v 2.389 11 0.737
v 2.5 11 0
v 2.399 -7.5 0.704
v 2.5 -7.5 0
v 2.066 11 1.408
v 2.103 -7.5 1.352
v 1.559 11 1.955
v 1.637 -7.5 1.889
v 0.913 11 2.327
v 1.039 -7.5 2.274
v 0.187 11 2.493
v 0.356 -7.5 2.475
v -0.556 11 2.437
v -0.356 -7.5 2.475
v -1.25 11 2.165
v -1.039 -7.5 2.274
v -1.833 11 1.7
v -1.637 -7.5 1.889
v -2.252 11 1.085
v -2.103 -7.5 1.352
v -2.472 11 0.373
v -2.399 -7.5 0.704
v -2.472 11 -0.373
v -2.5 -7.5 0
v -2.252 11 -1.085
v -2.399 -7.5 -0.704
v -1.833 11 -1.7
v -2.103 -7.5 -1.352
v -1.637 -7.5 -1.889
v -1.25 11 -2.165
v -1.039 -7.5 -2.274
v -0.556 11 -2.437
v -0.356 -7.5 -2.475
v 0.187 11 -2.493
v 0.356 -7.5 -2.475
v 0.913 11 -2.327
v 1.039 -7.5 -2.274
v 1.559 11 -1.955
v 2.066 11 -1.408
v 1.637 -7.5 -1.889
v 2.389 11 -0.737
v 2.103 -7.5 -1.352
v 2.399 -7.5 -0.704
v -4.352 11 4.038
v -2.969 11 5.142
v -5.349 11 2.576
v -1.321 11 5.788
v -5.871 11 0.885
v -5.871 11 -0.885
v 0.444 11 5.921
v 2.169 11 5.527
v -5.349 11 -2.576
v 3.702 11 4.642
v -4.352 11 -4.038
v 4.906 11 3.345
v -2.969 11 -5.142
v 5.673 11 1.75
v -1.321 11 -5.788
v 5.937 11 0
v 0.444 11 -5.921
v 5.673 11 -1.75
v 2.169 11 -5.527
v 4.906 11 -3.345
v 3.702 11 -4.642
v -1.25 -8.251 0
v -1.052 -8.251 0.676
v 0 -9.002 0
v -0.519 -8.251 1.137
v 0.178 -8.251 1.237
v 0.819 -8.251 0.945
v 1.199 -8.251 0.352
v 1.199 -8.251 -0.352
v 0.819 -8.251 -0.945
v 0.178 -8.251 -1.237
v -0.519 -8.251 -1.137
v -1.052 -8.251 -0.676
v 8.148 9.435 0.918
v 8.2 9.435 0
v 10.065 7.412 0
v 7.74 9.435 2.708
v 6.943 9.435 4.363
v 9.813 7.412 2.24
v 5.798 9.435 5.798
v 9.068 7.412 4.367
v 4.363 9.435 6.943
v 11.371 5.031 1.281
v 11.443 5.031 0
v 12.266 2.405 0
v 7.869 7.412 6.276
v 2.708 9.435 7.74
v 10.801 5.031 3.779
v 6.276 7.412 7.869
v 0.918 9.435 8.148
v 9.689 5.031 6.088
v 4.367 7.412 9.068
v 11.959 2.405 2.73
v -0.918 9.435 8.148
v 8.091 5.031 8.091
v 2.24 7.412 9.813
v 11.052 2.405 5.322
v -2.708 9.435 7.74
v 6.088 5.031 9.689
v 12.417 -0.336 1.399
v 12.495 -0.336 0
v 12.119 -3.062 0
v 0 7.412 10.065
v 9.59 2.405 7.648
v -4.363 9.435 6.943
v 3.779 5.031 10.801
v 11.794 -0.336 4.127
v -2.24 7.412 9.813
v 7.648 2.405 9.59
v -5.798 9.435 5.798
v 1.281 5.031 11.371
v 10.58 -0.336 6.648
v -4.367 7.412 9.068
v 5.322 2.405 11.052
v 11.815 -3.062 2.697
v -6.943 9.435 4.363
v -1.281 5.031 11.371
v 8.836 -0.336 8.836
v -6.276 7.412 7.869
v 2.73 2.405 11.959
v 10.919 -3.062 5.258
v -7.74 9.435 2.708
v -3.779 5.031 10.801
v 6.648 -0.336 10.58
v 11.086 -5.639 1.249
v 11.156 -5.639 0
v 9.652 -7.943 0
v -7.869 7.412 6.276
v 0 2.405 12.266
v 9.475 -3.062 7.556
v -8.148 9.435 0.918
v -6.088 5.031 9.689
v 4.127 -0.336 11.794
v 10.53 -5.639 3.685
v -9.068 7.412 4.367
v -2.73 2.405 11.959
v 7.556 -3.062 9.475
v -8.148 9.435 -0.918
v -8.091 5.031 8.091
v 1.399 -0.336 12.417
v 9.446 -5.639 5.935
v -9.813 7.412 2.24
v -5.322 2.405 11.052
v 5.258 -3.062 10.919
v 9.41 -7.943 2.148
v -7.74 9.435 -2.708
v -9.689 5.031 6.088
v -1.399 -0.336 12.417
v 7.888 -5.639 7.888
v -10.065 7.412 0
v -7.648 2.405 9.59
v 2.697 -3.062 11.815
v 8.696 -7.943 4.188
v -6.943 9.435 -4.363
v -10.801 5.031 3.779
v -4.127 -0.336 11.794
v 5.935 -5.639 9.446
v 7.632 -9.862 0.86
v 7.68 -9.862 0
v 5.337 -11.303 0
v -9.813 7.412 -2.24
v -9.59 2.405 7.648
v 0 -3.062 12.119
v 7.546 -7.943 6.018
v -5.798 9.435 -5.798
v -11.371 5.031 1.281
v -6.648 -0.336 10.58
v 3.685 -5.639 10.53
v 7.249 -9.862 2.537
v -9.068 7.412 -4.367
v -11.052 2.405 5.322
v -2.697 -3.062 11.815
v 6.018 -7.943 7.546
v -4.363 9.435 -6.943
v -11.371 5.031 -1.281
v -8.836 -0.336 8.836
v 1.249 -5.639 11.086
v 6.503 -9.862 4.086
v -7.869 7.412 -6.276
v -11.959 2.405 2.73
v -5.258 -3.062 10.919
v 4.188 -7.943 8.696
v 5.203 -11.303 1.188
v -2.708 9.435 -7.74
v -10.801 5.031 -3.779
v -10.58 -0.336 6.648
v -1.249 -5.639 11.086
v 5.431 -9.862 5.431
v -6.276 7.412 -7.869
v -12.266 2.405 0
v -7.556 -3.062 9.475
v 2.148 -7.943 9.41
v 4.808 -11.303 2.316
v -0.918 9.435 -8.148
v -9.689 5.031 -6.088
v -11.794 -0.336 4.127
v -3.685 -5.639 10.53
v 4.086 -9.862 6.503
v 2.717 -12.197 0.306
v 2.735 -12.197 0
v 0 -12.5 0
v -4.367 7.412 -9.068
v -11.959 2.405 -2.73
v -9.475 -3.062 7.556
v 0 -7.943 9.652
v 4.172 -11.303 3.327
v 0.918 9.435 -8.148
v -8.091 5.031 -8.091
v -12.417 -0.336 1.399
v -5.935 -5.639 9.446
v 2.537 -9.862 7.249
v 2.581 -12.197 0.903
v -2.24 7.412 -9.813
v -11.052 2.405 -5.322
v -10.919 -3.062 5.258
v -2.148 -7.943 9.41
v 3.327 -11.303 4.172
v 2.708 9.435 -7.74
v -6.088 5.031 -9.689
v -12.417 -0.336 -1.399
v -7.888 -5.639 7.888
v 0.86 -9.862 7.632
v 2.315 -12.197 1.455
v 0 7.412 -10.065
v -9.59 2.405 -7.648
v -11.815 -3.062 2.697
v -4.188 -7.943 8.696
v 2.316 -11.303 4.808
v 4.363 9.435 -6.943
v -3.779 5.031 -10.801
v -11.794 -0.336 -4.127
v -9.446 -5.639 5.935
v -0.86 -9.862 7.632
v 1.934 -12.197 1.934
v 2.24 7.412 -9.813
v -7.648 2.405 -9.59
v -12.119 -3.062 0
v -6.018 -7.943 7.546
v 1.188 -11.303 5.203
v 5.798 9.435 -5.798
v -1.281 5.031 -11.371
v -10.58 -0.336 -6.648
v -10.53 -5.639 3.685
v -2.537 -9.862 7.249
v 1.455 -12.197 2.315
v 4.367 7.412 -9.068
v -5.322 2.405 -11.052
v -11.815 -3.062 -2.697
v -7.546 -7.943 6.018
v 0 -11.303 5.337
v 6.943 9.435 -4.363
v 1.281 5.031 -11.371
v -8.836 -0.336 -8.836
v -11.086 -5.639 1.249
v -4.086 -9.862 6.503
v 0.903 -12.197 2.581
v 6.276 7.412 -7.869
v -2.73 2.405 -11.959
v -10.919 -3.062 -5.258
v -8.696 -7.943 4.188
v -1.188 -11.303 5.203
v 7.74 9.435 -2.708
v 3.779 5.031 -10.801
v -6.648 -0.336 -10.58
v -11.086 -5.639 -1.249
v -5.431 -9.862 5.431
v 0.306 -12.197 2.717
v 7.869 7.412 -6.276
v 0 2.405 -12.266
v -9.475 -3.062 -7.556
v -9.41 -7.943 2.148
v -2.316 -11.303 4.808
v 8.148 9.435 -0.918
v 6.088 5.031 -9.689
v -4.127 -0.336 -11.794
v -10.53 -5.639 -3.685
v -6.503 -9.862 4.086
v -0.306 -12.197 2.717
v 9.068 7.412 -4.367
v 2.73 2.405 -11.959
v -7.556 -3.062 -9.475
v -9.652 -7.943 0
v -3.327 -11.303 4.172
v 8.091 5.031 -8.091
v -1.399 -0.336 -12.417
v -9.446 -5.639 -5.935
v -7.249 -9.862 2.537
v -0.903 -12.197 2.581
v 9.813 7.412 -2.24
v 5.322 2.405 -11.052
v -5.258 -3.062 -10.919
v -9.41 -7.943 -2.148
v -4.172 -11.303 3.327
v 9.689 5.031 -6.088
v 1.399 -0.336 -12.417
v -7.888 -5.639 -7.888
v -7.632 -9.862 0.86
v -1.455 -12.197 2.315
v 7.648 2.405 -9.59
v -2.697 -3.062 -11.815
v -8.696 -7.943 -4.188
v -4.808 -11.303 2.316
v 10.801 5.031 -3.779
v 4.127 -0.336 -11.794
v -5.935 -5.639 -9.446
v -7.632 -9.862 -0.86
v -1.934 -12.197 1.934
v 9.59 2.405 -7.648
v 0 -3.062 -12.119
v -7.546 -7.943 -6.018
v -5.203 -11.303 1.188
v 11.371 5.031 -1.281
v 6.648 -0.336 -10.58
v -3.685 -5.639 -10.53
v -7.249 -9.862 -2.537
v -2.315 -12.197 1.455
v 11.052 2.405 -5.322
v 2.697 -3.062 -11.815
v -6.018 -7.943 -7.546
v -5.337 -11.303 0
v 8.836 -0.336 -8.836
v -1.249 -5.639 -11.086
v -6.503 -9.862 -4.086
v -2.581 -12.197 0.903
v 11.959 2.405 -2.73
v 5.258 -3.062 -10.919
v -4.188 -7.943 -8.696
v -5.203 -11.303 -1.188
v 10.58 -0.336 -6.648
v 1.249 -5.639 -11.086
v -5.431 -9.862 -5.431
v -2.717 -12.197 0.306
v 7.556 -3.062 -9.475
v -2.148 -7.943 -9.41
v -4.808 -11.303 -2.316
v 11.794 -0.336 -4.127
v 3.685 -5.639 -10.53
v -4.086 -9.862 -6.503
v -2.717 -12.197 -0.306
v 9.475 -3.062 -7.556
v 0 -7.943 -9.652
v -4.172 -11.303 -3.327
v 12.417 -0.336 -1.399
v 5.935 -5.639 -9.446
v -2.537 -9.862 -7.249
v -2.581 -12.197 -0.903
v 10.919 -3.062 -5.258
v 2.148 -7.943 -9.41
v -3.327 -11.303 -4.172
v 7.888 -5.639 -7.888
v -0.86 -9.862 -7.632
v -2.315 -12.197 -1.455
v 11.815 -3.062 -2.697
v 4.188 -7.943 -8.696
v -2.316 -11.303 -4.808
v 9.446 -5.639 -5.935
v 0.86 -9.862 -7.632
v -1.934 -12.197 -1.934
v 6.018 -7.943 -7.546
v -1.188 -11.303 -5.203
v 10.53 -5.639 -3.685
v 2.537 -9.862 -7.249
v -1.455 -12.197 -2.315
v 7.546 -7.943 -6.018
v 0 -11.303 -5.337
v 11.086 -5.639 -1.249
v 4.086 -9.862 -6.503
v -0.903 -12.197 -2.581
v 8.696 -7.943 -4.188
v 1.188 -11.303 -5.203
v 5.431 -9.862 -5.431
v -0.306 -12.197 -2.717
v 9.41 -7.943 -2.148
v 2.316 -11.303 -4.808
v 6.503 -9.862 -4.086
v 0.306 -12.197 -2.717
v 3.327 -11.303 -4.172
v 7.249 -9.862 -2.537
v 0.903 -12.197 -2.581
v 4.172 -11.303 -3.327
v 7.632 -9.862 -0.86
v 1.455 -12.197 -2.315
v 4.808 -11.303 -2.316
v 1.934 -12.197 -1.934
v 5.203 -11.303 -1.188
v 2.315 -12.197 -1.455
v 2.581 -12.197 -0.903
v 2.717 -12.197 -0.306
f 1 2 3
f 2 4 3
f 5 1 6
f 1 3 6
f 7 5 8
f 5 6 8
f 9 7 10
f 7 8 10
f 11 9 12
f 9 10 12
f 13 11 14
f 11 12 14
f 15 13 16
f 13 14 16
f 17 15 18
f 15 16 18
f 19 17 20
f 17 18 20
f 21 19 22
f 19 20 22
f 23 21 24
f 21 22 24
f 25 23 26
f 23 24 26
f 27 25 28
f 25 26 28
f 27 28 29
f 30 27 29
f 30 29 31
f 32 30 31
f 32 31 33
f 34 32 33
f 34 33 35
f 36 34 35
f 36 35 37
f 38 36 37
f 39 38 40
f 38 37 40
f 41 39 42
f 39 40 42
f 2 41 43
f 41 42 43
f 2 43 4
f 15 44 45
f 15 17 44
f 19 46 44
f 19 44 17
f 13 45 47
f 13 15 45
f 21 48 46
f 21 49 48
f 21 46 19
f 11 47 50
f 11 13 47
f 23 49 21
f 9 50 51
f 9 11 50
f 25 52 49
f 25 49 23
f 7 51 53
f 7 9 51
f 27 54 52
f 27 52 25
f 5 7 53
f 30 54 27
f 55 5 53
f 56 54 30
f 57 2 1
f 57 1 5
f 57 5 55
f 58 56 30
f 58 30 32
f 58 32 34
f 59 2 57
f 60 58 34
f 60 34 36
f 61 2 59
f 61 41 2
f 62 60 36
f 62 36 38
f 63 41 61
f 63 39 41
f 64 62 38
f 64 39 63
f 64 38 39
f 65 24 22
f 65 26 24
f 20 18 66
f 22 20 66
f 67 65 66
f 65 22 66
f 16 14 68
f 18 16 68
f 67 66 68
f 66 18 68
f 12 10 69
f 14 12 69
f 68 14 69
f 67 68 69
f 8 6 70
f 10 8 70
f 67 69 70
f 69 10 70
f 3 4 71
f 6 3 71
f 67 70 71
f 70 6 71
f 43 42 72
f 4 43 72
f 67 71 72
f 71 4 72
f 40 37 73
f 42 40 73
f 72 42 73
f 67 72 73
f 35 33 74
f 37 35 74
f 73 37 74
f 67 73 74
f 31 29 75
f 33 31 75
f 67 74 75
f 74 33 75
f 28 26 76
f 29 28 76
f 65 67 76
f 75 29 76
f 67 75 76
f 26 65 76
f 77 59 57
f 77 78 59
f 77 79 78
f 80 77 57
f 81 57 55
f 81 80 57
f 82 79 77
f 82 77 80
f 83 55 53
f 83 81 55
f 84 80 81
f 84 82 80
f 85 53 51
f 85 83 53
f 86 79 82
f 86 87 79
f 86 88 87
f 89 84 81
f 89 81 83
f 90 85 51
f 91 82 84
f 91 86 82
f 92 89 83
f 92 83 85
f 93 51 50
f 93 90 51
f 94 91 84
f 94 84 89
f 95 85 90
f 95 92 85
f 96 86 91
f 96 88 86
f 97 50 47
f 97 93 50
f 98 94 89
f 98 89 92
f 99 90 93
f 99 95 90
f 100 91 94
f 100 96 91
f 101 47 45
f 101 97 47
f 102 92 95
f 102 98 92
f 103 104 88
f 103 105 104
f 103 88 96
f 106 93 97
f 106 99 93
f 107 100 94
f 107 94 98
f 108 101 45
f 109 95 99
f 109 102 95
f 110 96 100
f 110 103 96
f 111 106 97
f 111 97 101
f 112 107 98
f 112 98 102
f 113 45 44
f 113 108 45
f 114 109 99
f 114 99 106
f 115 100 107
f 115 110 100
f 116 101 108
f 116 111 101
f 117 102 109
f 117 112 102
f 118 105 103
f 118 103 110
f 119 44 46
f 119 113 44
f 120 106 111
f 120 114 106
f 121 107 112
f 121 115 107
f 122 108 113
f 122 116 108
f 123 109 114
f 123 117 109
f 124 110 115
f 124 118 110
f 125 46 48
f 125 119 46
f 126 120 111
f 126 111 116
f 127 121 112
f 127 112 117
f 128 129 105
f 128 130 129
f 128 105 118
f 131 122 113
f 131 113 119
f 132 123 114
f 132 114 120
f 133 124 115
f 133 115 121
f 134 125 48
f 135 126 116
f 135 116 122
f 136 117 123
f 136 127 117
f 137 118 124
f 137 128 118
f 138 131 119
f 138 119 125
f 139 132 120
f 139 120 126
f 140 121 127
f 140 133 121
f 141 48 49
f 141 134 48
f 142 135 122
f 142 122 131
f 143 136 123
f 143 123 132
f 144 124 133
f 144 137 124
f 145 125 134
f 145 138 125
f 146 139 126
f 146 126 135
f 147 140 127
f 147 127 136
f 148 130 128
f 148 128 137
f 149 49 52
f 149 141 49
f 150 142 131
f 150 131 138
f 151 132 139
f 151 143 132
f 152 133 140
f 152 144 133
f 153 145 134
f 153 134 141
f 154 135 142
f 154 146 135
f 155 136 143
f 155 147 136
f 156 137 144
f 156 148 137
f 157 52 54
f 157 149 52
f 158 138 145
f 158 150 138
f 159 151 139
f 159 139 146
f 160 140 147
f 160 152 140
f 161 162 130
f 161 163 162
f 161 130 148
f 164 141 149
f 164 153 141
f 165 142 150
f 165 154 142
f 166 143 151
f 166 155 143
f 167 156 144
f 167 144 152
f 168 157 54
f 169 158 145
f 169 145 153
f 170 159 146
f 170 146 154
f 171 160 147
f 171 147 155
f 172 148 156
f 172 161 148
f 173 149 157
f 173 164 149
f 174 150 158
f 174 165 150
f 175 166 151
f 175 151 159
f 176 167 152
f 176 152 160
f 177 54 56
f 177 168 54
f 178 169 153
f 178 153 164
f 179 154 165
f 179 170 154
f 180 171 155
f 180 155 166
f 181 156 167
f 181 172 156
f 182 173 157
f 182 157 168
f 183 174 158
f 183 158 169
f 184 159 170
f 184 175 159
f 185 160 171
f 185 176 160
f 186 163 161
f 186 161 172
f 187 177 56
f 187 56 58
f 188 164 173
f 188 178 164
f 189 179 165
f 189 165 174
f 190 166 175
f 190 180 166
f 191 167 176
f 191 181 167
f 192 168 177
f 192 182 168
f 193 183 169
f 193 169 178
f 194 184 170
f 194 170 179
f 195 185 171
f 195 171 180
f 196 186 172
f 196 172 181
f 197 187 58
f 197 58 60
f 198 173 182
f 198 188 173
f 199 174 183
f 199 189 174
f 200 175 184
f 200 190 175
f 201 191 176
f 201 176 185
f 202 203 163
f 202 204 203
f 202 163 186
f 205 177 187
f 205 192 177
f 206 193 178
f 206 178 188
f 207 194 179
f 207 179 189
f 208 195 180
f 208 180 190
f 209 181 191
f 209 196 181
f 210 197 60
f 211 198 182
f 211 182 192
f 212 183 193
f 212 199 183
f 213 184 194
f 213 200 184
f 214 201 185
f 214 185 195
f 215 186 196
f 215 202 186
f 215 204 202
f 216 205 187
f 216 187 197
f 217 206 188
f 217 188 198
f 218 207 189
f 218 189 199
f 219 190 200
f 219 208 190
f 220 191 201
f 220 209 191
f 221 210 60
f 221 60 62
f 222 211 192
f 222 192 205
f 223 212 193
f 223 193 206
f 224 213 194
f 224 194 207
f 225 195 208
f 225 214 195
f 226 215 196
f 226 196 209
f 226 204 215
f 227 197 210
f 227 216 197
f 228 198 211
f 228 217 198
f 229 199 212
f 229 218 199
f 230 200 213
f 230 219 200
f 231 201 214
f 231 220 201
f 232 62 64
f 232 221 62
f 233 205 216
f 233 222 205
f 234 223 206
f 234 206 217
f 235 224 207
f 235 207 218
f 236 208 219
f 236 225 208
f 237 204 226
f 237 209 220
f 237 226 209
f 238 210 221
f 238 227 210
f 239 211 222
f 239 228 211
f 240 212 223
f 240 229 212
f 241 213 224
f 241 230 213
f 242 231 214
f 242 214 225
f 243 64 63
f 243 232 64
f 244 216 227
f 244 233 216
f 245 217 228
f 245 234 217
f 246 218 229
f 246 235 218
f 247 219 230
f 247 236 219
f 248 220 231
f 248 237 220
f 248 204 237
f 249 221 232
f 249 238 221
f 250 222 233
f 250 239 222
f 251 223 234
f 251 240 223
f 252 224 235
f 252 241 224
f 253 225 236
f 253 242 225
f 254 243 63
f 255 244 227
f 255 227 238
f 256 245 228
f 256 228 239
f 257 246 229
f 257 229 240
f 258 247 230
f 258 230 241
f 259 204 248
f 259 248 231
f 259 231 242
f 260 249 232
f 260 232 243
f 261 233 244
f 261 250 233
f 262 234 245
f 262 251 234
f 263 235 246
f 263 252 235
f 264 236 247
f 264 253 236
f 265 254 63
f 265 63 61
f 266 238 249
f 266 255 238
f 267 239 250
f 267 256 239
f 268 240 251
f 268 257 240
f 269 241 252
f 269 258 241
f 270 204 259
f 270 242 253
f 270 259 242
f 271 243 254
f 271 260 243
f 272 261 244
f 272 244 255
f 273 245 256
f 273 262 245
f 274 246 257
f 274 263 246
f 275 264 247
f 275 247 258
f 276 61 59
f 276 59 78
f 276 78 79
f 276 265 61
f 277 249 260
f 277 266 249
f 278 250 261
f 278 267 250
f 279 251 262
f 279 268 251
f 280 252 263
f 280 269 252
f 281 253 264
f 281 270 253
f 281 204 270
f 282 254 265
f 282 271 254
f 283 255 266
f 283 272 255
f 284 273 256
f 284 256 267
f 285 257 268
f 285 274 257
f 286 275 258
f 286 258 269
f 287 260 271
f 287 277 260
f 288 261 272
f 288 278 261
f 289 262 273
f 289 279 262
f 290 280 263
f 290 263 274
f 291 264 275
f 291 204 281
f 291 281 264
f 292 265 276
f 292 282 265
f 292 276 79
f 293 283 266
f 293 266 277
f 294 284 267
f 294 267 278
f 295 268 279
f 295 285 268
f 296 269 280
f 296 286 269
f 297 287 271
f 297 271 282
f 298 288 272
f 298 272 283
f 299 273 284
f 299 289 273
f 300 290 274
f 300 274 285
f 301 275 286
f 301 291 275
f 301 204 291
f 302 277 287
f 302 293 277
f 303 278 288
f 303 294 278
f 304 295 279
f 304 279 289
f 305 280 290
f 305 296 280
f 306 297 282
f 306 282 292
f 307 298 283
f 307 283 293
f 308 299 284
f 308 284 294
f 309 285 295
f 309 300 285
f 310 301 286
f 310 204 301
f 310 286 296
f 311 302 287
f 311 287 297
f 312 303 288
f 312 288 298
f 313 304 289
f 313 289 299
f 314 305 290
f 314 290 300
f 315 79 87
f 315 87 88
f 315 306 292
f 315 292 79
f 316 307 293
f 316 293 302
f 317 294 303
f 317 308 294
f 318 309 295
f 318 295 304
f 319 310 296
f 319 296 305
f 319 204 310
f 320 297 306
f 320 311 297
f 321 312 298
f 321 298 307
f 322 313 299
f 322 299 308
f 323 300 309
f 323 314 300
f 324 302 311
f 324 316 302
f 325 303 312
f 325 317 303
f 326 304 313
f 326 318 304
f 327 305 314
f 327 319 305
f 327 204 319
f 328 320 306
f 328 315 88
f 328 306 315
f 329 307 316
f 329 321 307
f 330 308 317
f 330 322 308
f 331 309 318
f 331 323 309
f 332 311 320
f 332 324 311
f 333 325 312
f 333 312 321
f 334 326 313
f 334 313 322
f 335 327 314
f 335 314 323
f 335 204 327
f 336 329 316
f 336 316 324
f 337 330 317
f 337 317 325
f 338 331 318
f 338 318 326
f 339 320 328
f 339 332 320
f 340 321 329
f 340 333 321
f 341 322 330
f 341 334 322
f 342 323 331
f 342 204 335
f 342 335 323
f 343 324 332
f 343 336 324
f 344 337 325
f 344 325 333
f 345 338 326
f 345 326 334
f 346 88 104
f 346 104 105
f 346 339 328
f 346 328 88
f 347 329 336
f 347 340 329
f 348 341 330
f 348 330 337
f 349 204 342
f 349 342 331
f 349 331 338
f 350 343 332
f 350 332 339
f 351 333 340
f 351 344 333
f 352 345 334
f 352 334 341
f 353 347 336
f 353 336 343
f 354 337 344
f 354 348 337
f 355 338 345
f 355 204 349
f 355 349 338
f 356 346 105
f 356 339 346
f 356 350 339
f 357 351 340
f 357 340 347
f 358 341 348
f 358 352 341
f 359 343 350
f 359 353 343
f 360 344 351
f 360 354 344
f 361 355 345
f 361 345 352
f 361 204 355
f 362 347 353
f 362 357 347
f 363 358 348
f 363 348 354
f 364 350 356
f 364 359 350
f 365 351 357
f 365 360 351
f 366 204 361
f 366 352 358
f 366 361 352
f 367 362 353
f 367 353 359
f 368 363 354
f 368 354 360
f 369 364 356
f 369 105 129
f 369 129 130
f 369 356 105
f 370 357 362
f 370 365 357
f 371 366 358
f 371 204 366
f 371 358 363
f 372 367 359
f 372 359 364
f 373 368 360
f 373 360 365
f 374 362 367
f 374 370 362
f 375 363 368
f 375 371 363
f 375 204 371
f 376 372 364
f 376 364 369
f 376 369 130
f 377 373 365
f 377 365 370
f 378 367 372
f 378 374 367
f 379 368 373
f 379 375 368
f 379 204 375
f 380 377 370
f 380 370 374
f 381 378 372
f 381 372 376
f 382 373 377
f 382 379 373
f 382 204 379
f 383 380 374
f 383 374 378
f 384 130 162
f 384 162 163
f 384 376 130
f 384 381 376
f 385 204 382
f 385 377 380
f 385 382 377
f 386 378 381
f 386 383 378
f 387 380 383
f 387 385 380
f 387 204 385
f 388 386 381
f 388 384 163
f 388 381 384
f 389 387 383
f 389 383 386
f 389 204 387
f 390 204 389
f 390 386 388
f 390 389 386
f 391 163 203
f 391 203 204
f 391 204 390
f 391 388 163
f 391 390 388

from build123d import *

# Parameters (mm, degrees)
TROU_TARAUD_M61_D     = 5
TROU_TARAUD_M61_DEPTH = 20
TROU_TARAUD_M61_TIP   = 1.502151548
EXTRUSION1_DEPTH      = 22.650635095
EXTRUSION1_DEPTH_BACK = 22.650635095
ESQUISSE5_W           = 11.874342088
ESQUISSE5_H           = 3.786271938


with BuildPart() as part:
    # Esquisse1 → Révolution1 (revolve)
    with BuildSketch(Plane.XY):
        with BuildLine():
            Line((0, -12.5), (0, 12.5))
            ThreePointArc((0, 12.5), (12.5, 0), (0, -12.5))
        make_face()
    revolve(axis=Axis((0, 81.368836261, 0), (0, -1, 0)))

    # Trou taraudé M61
    with Locations(Plane(origin=(0, 12.5, 0), x_dir=(-1, 0, 0), z_dir=(0, 1, 0))):
        with Locations((0, 0)):
            Hole(TROU_TARAUD_M61_D / 2, depth=TROU_TARAUD_M61_DEPTH)
            with Locations((0, 0, -(TROU_TARAUD_M61_DEPTH + TROU_TARAUD_M61_TIP / 2))):  # 118° drill point
                Cone(0, TROU_TARAUD_M61_D / 2, TROU_TARAUD_M61_TIP, mode=Mode.SUBTRACT)

    # Esquisse5 → Extrusion1 (cut, two sides: drawn at the far end of the back side and taken through both)
    with BuildSketch(Plane.XY.offset(-EXTRUSION1_DEPTH_BACK)):
        with Locations((0, 12.893135969)):
            Rectangle(ESQUISSE5_W, ESQUISSE5_H)
    extrude(amount=EXTRUSION1_DEPTH + EXTRUSION1_DEPTH_BACK, mode=Mode.SUBTRACT)


solid = part.part
